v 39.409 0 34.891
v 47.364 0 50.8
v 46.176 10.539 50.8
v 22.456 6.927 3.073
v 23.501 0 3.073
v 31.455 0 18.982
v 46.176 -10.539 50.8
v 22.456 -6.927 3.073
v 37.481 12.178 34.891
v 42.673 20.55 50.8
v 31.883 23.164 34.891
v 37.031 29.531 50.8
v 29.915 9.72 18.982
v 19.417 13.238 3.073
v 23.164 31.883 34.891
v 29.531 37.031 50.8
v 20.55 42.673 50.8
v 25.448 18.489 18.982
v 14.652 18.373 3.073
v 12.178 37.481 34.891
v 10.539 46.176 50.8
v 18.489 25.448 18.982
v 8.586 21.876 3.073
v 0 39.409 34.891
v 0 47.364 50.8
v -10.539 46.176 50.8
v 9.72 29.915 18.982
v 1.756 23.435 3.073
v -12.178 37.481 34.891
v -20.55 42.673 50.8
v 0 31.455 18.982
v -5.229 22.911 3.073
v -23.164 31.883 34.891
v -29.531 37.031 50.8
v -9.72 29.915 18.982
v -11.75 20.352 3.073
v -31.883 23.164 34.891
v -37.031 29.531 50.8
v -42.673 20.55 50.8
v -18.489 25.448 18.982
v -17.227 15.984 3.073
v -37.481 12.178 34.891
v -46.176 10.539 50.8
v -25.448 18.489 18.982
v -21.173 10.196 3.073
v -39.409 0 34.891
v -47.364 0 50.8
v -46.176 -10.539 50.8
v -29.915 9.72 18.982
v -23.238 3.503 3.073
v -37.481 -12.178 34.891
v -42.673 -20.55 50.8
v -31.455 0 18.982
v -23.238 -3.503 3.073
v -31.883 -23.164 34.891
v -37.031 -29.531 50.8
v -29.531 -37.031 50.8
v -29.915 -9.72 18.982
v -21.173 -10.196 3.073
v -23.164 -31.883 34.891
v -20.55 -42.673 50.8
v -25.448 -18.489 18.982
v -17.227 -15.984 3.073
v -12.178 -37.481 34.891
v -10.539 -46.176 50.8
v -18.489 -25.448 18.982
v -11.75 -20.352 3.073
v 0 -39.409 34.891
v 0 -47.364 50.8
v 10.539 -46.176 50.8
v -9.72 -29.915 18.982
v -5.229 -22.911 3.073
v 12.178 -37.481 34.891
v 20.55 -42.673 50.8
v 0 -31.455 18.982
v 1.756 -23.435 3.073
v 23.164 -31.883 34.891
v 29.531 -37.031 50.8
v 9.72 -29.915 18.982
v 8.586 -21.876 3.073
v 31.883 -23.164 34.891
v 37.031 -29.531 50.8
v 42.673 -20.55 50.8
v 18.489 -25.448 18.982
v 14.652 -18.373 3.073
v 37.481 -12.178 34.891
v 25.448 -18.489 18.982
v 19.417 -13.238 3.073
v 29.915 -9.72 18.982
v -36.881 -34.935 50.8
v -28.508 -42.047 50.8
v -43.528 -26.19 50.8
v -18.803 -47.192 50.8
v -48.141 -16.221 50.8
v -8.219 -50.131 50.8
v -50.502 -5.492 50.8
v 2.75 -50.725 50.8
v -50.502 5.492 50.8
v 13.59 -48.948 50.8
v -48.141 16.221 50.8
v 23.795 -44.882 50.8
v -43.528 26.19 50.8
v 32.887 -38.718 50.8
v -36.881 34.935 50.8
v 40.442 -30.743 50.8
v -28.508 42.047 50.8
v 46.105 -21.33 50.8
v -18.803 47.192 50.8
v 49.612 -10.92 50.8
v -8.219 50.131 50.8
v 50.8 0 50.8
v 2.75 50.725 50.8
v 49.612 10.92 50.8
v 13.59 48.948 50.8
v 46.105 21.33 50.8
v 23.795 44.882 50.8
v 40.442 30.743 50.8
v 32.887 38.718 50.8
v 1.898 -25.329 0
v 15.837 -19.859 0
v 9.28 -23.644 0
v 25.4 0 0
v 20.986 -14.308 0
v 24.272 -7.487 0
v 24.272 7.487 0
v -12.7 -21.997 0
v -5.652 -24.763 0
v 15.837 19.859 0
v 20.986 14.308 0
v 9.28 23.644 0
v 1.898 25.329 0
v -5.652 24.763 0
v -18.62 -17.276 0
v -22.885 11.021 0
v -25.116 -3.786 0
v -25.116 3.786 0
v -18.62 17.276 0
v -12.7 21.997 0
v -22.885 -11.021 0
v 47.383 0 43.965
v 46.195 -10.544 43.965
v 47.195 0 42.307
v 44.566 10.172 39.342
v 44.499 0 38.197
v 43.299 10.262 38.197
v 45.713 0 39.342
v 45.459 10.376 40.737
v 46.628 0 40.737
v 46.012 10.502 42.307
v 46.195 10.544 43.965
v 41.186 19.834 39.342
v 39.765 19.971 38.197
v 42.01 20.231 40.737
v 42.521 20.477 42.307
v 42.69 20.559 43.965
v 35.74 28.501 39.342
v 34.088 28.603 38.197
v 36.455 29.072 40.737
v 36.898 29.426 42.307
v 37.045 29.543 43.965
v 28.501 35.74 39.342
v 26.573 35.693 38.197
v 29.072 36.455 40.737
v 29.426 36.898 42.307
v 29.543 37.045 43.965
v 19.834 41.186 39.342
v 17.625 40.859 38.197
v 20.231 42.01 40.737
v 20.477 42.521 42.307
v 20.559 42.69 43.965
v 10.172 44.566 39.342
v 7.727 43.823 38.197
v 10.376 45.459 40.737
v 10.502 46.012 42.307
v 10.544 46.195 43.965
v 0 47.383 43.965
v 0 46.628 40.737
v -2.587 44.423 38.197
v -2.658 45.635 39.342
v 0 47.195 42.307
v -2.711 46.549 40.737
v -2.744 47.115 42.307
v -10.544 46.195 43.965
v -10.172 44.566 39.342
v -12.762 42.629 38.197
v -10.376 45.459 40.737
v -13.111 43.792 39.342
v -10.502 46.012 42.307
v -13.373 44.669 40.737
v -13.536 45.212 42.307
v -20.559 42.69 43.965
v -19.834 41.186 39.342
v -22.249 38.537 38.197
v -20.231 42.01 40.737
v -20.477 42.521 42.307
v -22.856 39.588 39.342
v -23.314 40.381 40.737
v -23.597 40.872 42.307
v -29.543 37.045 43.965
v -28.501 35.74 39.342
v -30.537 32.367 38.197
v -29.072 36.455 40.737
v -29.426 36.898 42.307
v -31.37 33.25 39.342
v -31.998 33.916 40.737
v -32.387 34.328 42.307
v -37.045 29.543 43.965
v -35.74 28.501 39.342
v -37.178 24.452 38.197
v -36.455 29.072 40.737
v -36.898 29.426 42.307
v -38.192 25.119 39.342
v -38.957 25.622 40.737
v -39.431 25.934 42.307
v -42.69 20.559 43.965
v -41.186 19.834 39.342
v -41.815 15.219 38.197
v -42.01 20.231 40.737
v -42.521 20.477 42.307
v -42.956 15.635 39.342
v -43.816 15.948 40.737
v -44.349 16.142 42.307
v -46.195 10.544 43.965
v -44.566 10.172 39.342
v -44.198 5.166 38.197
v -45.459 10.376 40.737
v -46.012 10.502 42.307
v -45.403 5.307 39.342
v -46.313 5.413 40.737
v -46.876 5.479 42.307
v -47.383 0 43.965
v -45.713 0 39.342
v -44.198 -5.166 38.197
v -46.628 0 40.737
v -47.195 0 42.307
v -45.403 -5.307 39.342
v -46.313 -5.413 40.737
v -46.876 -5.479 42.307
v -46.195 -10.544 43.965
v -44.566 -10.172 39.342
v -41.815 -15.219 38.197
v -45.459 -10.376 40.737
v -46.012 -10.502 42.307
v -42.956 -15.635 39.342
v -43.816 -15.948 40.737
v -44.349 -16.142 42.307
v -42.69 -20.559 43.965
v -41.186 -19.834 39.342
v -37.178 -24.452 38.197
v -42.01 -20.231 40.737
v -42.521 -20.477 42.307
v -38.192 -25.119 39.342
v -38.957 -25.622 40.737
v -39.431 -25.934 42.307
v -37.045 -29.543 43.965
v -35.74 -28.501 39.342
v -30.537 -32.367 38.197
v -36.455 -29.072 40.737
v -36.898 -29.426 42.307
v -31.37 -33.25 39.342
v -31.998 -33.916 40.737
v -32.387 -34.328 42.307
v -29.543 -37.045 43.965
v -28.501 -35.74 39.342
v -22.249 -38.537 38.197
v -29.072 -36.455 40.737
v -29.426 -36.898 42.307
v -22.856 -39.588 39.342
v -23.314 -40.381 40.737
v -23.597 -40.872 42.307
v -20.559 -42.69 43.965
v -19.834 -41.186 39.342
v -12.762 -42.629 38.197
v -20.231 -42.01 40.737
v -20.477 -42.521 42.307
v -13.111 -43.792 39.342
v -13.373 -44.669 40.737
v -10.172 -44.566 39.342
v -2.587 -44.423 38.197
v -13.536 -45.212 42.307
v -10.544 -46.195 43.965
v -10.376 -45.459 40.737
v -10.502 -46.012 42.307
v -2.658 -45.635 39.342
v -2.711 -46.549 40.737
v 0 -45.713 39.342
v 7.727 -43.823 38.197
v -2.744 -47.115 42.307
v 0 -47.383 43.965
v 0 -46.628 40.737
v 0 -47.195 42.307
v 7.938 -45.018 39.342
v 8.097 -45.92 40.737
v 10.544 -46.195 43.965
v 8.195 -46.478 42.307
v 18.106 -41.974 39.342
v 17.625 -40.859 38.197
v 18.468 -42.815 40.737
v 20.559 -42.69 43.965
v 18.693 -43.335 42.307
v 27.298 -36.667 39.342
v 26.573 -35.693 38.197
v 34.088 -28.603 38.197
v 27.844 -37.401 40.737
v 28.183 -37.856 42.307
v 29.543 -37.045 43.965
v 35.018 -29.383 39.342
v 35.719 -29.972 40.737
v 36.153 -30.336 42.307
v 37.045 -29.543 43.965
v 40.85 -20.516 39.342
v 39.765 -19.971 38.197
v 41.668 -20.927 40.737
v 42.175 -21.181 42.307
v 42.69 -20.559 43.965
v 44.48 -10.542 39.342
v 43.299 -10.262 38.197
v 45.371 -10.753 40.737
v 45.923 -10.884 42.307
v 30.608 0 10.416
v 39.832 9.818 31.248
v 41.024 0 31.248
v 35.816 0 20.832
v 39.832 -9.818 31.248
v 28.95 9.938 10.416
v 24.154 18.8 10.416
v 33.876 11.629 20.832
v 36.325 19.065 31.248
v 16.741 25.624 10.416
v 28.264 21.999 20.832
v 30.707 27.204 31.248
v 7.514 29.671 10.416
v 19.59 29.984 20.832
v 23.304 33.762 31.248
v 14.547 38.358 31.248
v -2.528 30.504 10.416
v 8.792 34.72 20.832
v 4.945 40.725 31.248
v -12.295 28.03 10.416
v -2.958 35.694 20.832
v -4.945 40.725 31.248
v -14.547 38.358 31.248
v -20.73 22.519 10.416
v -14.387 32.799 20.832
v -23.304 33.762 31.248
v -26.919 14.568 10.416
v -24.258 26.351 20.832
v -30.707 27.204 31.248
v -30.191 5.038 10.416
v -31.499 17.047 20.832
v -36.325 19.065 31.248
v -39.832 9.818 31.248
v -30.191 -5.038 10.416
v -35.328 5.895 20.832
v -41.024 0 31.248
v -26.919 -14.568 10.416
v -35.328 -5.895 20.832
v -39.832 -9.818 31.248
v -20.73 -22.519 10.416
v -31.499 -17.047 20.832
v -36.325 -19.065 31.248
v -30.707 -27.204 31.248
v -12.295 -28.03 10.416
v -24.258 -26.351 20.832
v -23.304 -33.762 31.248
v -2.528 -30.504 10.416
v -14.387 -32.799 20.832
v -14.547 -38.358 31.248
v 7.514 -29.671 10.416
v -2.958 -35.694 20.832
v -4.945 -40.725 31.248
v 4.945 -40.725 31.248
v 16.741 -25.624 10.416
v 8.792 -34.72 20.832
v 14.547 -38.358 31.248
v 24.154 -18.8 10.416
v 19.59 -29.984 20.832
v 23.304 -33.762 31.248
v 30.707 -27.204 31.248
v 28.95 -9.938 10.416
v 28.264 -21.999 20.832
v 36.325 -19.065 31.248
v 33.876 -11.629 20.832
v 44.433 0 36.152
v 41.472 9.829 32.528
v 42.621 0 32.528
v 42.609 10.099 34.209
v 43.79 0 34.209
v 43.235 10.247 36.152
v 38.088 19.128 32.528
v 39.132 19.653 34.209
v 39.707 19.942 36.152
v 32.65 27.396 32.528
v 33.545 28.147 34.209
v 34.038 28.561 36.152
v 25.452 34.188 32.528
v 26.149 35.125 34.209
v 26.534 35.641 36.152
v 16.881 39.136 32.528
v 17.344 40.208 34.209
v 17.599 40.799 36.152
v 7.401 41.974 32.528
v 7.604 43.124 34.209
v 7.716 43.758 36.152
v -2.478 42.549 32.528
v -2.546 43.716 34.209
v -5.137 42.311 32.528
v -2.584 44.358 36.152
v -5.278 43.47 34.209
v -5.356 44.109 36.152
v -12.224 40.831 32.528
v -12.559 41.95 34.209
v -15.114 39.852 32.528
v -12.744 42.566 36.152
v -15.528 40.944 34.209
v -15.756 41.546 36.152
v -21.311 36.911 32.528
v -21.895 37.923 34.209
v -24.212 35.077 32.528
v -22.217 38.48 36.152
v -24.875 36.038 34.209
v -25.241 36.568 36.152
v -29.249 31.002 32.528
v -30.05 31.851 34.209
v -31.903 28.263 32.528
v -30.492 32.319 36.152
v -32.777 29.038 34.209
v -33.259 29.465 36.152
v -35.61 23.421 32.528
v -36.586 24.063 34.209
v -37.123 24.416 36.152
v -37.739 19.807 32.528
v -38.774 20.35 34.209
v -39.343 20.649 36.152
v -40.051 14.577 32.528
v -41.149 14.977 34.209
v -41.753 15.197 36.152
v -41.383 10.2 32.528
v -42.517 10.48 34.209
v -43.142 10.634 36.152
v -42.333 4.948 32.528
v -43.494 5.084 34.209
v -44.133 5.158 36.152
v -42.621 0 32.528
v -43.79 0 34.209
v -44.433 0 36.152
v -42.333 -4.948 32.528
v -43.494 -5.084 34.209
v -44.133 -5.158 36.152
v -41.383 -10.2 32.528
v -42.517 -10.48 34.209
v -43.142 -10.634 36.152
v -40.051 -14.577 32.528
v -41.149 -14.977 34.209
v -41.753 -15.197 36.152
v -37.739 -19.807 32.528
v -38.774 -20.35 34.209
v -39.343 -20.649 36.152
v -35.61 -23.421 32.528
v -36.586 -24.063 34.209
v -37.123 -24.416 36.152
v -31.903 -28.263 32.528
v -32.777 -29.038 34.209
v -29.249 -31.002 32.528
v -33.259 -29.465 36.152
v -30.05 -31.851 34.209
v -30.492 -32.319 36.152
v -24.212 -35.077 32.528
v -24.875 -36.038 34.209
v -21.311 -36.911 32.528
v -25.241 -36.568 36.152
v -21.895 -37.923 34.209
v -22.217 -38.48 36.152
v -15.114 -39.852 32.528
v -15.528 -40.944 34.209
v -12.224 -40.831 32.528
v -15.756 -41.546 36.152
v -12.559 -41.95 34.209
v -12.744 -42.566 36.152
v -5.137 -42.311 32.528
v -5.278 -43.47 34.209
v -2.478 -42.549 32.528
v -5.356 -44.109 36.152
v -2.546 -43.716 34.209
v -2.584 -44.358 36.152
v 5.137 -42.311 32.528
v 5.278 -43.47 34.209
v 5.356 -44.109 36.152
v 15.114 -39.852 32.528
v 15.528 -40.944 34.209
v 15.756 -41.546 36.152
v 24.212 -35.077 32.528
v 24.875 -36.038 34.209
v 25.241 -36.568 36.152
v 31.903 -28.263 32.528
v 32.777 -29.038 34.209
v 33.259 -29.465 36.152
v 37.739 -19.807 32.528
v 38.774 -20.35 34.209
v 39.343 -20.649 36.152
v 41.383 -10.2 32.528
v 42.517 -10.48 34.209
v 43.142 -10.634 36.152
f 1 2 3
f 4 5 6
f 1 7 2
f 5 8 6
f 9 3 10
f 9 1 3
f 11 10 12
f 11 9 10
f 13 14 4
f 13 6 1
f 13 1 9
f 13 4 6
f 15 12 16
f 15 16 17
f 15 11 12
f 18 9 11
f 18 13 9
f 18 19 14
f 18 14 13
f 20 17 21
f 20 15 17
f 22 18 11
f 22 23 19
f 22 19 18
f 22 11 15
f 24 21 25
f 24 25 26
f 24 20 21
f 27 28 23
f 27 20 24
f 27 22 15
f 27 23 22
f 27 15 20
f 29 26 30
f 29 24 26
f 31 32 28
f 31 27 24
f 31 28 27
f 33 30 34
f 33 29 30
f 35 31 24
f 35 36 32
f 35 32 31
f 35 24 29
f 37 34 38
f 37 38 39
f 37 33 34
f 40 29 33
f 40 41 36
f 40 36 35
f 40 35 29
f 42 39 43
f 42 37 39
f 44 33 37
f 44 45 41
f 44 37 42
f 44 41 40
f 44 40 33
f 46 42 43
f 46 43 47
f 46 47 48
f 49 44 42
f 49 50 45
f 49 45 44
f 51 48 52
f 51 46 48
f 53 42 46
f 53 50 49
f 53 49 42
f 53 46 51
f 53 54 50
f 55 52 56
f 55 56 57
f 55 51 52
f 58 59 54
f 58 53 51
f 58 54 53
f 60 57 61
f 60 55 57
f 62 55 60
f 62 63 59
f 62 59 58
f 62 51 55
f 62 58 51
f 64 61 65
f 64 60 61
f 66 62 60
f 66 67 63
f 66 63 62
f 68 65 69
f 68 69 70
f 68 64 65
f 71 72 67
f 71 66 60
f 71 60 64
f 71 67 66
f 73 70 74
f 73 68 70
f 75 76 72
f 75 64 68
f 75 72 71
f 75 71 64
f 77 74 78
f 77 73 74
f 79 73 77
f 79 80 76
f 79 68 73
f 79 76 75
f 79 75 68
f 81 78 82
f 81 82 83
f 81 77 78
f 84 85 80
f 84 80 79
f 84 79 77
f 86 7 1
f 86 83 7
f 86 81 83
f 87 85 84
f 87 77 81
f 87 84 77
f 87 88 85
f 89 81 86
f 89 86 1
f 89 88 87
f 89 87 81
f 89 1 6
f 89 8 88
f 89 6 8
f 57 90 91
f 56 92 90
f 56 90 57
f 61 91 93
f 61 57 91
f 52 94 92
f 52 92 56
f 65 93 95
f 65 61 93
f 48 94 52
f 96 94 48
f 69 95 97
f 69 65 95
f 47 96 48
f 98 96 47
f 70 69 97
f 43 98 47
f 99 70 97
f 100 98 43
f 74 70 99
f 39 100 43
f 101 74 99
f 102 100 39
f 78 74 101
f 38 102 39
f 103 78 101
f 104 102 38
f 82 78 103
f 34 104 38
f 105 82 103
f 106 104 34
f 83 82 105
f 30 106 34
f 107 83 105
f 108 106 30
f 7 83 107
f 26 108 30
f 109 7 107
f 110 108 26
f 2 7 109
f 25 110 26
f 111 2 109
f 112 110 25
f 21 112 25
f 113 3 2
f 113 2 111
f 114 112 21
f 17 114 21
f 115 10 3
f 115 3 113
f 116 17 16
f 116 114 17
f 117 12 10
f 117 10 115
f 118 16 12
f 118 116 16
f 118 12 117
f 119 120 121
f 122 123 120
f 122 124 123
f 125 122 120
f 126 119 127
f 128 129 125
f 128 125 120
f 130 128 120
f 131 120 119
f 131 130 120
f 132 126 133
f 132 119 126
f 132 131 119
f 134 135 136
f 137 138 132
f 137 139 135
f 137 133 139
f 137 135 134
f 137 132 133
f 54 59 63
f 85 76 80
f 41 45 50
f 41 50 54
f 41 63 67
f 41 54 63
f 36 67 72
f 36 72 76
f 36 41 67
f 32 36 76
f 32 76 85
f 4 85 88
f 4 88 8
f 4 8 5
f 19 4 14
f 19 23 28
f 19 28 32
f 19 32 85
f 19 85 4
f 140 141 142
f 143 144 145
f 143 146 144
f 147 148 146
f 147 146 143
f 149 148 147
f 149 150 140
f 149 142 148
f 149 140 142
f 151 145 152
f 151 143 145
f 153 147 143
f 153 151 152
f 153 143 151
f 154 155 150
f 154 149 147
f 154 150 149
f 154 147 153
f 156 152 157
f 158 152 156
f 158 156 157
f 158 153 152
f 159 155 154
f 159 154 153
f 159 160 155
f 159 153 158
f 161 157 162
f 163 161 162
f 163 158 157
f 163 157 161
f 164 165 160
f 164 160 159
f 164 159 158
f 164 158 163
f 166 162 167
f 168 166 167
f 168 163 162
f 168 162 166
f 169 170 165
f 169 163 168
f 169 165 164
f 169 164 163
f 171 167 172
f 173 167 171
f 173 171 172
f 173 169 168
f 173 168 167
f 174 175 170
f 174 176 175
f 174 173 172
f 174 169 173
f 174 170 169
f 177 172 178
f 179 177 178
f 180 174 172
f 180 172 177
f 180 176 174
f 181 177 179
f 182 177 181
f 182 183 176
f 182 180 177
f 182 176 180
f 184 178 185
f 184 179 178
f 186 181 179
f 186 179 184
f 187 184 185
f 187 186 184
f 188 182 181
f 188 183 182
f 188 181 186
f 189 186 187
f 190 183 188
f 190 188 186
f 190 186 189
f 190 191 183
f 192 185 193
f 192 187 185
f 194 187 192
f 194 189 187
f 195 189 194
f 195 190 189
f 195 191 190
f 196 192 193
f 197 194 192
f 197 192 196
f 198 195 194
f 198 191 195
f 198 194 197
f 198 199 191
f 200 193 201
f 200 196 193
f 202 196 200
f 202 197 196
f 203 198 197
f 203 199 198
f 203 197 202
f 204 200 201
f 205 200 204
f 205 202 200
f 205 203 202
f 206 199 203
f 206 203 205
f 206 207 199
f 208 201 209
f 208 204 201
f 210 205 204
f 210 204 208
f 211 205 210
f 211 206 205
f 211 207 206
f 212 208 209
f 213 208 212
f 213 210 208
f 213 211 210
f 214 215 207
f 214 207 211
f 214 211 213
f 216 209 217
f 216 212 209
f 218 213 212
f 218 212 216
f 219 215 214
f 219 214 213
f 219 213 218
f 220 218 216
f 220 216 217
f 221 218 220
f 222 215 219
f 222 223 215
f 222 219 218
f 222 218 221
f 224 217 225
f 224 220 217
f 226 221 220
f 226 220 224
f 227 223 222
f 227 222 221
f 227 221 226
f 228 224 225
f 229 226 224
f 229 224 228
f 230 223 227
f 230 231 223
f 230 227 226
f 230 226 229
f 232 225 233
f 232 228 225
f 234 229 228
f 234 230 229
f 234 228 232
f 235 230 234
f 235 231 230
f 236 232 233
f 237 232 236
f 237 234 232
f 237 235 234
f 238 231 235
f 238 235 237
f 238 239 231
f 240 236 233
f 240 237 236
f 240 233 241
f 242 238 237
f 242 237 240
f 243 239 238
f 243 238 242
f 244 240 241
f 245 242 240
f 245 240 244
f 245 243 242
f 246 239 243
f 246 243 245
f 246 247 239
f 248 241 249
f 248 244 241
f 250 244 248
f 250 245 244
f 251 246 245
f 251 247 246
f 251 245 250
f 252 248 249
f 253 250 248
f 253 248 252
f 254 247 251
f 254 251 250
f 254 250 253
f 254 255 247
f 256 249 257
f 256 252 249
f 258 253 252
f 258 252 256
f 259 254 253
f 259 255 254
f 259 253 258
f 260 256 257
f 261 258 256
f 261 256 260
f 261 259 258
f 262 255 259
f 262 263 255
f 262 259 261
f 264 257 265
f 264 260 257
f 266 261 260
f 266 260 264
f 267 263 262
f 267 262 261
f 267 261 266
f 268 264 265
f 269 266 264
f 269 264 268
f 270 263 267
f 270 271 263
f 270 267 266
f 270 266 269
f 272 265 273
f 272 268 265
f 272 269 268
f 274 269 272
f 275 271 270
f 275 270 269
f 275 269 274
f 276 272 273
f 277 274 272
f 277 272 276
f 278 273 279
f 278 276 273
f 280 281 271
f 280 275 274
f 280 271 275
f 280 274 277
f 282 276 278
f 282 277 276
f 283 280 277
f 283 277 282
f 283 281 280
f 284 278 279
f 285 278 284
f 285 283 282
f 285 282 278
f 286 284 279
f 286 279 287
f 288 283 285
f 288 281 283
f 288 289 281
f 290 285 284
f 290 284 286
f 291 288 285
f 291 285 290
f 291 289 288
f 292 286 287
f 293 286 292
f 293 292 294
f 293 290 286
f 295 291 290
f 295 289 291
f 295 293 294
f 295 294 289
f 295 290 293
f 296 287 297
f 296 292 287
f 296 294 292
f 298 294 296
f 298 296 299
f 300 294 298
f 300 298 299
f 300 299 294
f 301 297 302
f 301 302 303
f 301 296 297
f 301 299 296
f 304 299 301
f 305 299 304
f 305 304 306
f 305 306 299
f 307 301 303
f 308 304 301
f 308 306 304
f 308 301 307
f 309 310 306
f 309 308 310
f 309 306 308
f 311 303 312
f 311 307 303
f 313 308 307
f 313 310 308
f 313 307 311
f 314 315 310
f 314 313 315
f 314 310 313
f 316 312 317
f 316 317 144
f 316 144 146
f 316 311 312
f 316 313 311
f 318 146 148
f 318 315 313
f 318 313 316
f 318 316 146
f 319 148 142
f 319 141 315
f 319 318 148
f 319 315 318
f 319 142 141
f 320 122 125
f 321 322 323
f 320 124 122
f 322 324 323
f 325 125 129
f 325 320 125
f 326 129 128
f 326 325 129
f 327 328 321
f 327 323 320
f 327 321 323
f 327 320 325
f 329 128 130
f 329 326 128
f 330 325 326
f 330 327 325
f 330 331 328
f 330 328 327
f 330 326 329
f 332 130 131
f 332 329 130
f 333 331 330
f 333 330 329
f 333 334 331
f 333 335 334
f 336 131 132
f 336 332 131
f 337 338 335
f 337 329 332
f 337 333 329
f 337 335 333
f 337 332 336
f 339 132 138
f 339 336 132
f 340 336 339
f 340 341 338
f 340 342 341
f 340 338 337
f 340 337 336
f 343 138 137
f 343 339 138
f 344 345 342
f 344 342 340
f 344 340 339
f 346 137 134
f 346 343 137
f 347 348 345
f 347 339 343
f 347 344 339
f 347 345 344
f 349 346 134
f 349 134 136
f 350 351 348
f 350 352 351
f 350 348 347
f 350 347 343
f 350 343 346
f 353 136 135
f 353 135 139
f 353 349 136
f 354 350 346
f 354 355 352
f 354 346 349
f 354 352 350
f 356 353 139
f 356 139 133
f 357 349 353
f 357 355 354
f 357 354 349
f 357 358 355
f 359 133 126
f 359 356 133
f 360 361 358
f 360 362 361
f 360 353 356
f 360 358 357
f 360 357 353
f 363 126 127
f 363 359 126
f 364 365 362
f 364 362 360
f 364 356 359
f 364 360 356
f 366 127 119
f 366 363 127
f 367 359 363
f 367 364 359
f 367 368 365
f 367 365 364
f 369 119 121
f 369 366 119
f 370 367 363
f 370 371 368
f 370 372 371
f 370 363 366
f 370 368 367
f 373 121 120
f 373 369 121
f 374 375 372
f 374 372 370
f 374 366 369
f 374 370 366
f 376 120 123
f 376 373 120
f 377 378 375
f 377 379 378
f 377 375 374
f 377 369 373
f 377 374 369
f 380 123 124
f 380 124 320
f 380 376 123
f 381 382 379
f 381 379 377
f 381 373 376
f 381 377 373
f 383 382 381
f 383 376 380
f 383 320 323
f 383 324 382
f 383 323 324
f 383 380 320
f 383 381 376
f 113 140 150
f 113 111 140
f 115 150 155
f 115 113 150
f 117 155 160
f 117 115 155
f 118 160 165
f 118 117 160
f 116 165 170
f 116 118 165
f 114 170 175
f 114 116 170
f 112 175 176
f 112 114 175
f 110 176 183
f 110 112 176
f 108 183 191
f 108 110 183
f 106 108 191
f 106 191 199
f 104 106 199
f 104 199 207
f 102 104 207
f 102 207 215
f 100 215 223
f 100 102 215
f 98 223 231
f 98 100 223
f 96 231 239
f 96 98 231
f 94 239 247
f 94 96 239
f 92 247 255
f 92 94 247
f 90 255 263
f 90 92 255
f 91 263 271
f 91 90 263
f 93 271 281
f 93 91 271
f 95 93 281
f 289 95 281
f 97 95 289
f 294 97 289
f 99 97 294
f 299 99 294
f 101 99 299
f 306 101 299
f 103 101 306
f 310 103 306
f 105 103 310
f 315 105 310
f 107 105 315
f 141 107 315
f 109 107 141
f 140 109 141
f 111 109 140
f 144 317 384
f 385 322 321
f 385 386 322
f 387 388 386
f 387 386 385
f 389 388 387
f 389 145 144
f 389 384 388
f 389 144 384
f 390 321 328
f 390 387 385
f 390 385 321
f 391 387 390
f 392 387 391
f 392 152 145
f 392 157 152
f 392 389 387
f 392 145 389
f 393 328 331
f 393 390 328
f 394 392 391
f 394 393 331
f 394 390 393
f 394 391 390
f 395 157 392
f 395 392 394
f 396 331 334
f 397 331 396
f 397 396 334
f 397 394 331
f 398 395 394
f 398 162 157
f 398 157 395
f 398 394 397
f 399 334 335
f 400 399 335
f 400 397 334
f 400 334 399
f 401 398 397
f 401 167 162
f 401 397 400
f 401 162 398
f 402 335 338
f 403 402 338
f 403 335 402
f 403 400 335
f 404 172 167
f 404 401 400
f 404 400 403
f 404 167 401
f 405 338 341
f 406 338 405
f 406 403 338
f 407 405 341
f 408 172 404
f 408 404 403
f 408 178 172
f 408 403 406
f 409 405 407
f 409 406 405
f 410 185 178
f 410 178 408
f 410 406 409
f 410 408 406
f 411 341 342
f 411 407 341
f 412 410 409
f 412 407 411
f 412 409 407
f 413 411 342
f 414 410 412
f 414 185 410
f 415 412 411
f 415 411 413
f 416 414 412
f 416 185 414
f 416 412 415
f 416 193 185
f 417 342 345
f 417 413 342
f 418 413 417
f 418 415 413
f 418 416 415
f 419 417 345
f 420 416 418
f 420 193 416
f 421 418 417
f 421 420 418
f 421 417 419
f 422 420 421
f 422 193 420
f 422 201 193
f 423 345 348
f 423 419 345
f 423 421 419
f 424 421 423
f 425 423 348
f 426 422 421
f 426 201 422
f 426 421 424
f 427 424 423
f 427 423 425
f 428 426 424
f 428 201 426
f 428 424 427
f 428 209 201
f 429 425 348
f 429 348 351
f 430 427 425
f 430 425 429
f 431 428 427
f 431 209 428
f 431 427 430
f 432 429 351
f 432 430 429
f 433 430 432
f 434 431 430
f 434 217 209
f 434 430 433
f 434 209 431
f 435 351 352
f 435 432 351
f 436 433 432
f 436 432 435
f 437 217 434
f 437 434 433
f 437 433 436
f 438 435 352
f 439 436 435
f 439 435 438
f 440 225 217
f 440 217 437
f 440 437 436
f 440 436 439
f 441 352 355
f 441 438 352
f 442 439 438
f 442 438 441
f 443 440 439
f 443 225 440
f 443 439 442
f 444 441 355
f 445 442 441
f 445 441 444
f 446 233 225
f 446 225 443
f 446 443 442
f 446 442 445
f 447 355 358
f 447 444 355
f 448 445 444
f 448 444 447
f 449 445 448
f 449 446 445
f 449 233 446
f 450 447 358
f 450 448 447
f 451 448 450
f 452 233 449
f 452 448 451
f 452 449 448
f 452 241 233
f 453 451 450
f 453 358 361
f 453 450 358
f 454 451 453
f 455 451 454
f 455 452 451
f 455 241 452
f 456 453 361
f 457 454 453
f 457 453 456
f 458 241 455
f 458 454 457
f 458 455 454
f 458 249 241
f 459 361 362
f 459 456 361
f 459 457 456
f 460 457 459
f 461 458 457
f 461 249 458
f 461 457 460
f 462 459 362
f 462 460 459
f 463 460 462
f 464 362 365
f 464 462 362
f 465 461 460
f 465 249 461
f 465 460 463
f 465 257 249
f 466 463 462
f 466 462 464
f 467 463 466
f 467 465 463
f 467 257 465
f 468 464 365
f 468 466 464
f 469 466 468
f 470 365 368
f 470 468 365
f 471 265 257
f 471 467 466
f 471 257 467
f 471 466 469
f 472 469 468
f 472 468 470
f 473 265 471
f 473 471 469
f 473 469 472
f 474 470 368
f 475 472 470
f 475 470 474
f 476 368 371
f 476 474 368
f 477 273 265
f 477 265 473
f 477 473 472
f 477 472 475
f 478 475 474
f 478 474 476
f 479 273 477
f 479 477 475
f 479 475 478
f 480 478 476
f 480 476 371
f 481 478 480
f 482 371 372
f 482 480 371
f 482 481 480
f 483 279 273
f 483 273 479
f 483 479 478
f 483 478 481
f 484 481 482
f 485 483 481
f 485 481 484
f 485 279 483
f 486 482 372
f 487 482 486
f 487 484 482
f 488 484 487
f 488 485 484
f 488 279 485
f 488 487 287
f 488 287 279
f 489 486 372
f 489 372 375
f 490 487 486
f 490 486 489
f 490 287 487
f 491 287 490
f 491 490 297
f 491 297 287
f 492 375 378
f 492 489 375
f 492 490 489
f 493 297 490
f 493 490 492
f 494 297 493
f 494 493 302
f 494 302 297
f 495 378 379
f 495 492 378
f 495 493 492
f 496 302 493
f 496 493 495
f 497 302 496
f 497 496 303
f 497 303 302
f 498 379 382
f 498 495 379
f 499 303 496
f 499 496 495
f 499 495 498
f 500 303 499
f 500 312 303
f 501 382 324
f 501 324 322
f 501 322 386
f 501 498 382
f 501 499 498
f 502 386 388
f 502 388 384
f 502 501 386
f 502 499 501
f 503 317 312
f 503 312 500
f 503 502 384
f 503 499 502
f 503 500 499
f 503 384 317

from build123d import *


with BuildPart() as f1:
    # F0 (on Front) → F1 (revolve)
    with BuildSketch(Plane.XZ):
        Polygon((0, 3.0734), (0, 0), (25.4, 0), (41.024185, 31.24837), (44.498579, 38.197157), (47.382554, 43.965108), (50.8, 50.8), (47.363834, 50.8), (23.500534, 3.0734), align=None)
        with BuildLine():
            Line((47.382554, 43.965108), (44.498579, 38.197157))
            ThreePointArc((44.498579, 38.197157), (46.627971, 40.737431), (47.382554, 43.965108))
        make_face()
        with BuildLine():
            Line((44.498579, 38.197157), (41.024185, 31.24837))
            ThreePointArc((41.024185, 31.24837), (43.789655, 34.208627), (44.498579, 38.197157))
        make_face()
    revolve(axis=Axis((0, 0, 25.4), (0, 0, 1)))


solid = f1.part
